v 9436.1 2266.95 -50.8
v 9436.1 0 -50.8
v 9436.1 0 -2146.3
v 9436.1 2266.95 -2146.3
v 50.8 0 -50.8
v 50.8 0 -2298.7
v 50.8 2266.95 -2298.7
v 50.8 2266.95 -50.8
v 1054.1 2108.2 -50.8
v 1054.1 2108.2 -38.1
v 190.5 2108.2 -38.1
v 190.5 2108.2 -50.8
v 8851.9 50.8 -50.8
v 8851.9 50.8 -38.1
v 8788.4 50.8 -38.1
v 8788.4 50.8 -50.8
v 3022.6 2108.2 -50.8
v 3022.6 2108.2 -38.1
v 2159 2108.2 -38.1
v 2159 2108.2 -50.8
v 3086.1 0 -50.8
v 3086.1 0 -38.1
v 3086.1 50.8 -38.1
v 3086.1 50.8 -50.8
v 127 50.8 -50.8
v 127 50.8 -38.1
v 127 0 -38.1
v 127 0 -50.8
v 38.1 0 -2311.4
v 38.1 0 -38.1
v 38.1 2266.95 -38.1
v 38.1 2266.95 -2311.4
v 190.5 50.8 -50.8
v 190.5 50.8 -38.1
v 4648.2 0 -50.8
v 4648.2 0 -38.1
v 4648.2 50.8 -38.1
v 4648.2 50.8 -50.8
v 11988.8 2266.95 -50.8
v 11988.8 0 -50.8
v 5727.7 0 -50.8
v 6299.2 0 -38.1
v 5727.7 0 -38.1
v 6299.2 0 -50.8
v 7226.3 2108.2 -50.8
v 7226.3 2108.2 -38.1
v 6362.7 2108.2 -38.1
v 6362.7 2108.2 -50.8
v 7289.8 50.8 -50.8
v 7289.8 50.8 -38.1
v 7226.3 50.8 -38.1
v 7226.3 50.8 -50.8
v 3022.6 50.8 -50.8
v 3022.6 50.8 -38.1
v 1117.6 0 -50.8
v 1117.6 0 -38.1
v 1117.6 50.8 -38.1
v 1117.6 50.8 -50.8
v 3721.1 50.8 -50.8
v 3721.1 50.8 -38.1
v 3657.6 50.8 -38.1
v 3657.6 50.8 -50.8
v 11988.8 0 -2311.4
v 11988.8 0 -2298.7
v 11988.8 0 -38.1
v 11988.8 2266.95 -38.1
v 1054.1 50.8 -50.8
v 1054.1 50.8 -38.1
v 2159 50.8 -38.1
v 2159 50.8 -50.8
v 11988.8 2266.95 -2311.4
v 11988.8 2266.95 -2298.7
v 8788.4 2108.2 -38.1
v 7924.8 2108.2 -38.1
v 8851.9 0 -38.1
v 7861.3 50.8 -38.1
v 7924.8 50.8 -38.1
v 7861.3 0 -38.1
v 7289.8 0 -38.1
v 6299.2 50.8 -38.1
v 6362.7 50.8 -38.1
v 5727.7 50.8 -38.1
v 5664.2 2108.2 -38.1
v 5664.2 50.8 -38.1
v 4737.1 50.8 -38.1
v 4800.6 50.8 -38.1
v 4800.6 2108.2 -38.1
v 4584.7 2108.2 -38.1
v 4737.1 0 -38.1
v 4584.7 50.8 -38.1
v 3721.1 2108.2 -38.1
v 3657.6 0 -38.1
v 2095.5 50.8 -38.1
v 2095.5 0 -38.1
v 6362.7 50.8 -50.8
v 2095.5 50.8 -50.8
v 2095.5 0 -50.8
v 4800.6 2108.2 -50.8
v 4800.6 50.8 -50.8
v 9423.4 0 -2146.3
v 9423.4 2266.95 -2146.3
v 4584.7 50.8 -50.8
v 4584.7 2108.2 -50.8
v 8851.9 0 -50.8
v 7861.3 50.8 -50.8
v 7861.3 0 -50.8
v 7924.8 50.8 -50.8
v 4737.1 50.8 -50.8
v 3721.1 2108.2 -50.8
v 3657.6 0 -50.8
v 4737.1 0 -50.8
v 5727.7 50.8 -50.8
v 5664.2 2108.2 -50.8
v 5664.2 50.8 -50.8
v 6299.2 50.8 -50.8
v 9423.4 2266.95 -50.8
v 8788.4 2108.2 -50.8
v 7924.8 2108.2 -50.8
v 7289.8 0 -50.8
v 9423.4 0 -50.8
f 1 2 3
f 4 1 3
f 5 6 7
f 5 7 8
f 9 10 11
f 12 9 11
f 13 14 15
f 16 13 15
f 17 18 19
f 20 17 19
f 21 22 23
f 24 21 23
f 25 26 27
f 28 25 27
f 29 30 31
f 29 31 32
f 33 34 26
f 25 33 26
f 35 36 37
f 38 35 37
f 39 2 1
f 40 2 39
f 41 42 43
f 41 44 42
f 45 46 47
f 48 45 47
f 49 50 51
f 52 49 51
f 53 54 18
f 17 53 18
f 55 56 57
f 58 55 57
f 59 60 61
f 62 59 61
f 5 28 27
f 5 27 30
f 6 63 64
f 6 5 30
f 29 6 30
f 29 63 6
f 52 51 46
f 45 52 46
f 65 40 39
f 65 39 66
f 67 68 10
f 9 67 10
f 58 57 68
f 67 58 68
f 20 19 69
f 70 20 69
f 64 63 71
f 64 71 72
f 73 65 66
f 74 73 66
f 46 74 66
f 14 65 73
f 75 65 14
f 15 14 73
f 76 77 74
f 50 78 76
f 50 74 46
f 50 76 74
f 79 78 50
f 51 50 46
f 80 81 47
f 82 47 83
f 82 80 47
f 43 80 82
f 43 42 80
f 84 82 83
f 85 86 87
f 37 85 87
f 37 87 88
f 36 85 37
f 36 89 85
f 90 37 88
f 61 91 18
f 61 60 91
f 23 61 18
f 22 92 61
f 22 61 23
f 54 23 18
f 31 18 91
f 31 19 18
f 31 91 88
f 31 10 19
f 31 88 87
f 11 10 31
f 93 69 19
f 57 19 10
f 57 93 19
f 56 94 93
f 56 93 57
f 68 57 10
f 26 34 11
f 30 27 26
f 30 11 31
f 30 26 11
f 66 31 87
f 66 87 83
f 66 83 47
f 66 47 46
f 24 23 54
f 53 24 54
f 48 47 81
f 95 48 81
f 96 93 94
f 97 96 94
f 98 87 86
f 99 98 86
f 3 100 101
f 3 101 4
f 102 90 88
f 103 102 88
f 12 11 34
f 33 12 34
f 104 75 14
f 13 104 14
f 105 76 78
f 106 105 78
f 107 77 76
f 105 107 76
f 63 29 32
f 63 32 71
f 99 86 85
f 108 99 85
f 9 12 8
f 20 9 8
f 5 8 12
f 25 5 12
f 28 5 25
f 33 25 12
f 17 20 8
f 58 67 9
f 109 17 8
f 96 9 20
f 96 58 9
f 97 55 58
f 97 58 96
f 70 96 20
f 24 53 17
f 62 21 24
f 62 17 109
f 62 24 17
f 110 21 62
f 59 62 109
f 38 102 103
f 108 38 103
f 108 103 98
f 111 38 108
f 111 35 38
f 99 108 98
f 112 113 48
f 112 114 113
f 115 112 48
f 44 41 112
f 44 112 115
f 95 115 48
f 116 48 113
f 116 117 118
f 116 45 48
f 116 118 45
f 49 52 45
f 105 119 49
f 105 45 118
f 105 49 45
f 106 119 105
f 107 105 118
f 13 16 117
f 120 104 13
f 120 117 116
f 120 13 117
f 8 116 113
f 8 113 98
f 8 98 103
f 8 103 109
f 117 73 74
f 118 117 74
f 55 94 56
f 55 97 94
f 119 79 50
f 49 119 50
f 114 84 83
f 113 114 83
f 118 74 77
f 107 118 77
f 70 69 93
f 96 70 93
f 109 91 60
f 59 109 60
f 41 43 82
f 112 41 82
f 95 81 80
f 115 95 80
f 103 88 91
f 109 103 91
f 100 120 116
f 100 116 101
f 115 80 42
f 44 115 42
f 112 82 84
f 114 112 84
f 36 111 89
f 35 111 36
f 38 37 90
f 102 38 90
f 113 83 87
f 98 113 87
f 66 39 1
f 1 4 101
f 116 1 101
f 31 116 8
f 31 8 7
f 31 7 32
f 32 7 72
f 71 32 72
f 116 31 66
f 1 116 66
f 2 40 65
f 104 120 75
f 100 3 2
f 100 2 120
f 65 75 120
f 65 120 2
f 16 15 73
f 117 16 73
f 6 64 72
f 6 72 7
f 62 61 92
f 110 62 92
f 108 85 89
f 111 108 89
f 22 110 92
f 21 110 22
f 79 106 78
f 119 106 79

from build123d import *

# Parameters (mm, degrees)
SKETCH1_W           = 12.7
SKETCH1_H           = 2095.5
BOSS_EXTRUDE1_DEPTH = 2266.95
CUT_EXTRUDE2_DEPTH  = 12.7


with BuildPart() as part:
    # Sketch1 → Boss-Extrude1 (new body)
    with BuildSketch(Plane(origin=(0, 0, 0), x_dir=(1, 0, 0), z_dir=(0, 1, 0))):
        Polygon((11988.8, 2311.4), (11988.8, 2298.7), (50.8, 2298.7), (50.8, 50.8), (11988.8, 50.8), (11988.8, 38.1), (38.1, 38.1), (38.1, 2311.4), align=None)
        with Locations((9429.75, 1098.55)):
            Rectangle(SKETCH1_W, SKETCH1_H)
    extrude(amount=BOSS_EXTRUDE1_DEPTH)

    # Sketch2 → Cut-Extrude2 (cut)
    with BuildSketch(Plane.XY.offset(-38.1)):
        Polygon((190.5, 50.8), (127, 50.8), (127, 0), (1117.6, 0), (1117.6, 50.8), (1054.1, 50.8), (1054.1, 2108.2), (190.5, 2108.2), align=None)
        Polygon((2095.5, 50.8), (2095.5, 0), (3086.1, 0), (3086.1, 50.8), (3022.6, 50.8), (3022.6, 2108.2), (2159, 2108.2), (2159, 50.8), align=None)
        Polygon((3657.6, 50.8), (3657.6, 0), (4648.2, 0), (4648.2, 50.8), (4584.7, 50.8), (4584.7, 2108.2), (3721.1, 2108.2), (3721.1, 50.8), align=None)
        Polygon((4737.1, 50.8), (4737.1, 0), (5727.7, 0), (5727.7, 50.8), (5664.2, 50.8), (5664.2, 2108.2), (4800.6, 2108.2), (4800.6, 50.8), align=None)
        Polygon((6299.2, 50.8), (6299.2, 0), (7289.8, 0), (7289.8, 50.8), (7226.3, 50.8), (7226.3, 2108.2), (6362.7, 2108.2), (6362.7, 50.8), align=None)
        Polygon((7861.3, 50.8), (7861.3, 0), (8851.9, 0), (8851.9, 50.8), (8788.4, 50.8), (8788.4, 2108.2), (7924.8, 2108.2), (7924.8, 50.8), align=None)
    extrude(amount=-CUT_EXTRUDE2_DEPTH, mode=Mode.SUBTRACT)


solid = part.part
